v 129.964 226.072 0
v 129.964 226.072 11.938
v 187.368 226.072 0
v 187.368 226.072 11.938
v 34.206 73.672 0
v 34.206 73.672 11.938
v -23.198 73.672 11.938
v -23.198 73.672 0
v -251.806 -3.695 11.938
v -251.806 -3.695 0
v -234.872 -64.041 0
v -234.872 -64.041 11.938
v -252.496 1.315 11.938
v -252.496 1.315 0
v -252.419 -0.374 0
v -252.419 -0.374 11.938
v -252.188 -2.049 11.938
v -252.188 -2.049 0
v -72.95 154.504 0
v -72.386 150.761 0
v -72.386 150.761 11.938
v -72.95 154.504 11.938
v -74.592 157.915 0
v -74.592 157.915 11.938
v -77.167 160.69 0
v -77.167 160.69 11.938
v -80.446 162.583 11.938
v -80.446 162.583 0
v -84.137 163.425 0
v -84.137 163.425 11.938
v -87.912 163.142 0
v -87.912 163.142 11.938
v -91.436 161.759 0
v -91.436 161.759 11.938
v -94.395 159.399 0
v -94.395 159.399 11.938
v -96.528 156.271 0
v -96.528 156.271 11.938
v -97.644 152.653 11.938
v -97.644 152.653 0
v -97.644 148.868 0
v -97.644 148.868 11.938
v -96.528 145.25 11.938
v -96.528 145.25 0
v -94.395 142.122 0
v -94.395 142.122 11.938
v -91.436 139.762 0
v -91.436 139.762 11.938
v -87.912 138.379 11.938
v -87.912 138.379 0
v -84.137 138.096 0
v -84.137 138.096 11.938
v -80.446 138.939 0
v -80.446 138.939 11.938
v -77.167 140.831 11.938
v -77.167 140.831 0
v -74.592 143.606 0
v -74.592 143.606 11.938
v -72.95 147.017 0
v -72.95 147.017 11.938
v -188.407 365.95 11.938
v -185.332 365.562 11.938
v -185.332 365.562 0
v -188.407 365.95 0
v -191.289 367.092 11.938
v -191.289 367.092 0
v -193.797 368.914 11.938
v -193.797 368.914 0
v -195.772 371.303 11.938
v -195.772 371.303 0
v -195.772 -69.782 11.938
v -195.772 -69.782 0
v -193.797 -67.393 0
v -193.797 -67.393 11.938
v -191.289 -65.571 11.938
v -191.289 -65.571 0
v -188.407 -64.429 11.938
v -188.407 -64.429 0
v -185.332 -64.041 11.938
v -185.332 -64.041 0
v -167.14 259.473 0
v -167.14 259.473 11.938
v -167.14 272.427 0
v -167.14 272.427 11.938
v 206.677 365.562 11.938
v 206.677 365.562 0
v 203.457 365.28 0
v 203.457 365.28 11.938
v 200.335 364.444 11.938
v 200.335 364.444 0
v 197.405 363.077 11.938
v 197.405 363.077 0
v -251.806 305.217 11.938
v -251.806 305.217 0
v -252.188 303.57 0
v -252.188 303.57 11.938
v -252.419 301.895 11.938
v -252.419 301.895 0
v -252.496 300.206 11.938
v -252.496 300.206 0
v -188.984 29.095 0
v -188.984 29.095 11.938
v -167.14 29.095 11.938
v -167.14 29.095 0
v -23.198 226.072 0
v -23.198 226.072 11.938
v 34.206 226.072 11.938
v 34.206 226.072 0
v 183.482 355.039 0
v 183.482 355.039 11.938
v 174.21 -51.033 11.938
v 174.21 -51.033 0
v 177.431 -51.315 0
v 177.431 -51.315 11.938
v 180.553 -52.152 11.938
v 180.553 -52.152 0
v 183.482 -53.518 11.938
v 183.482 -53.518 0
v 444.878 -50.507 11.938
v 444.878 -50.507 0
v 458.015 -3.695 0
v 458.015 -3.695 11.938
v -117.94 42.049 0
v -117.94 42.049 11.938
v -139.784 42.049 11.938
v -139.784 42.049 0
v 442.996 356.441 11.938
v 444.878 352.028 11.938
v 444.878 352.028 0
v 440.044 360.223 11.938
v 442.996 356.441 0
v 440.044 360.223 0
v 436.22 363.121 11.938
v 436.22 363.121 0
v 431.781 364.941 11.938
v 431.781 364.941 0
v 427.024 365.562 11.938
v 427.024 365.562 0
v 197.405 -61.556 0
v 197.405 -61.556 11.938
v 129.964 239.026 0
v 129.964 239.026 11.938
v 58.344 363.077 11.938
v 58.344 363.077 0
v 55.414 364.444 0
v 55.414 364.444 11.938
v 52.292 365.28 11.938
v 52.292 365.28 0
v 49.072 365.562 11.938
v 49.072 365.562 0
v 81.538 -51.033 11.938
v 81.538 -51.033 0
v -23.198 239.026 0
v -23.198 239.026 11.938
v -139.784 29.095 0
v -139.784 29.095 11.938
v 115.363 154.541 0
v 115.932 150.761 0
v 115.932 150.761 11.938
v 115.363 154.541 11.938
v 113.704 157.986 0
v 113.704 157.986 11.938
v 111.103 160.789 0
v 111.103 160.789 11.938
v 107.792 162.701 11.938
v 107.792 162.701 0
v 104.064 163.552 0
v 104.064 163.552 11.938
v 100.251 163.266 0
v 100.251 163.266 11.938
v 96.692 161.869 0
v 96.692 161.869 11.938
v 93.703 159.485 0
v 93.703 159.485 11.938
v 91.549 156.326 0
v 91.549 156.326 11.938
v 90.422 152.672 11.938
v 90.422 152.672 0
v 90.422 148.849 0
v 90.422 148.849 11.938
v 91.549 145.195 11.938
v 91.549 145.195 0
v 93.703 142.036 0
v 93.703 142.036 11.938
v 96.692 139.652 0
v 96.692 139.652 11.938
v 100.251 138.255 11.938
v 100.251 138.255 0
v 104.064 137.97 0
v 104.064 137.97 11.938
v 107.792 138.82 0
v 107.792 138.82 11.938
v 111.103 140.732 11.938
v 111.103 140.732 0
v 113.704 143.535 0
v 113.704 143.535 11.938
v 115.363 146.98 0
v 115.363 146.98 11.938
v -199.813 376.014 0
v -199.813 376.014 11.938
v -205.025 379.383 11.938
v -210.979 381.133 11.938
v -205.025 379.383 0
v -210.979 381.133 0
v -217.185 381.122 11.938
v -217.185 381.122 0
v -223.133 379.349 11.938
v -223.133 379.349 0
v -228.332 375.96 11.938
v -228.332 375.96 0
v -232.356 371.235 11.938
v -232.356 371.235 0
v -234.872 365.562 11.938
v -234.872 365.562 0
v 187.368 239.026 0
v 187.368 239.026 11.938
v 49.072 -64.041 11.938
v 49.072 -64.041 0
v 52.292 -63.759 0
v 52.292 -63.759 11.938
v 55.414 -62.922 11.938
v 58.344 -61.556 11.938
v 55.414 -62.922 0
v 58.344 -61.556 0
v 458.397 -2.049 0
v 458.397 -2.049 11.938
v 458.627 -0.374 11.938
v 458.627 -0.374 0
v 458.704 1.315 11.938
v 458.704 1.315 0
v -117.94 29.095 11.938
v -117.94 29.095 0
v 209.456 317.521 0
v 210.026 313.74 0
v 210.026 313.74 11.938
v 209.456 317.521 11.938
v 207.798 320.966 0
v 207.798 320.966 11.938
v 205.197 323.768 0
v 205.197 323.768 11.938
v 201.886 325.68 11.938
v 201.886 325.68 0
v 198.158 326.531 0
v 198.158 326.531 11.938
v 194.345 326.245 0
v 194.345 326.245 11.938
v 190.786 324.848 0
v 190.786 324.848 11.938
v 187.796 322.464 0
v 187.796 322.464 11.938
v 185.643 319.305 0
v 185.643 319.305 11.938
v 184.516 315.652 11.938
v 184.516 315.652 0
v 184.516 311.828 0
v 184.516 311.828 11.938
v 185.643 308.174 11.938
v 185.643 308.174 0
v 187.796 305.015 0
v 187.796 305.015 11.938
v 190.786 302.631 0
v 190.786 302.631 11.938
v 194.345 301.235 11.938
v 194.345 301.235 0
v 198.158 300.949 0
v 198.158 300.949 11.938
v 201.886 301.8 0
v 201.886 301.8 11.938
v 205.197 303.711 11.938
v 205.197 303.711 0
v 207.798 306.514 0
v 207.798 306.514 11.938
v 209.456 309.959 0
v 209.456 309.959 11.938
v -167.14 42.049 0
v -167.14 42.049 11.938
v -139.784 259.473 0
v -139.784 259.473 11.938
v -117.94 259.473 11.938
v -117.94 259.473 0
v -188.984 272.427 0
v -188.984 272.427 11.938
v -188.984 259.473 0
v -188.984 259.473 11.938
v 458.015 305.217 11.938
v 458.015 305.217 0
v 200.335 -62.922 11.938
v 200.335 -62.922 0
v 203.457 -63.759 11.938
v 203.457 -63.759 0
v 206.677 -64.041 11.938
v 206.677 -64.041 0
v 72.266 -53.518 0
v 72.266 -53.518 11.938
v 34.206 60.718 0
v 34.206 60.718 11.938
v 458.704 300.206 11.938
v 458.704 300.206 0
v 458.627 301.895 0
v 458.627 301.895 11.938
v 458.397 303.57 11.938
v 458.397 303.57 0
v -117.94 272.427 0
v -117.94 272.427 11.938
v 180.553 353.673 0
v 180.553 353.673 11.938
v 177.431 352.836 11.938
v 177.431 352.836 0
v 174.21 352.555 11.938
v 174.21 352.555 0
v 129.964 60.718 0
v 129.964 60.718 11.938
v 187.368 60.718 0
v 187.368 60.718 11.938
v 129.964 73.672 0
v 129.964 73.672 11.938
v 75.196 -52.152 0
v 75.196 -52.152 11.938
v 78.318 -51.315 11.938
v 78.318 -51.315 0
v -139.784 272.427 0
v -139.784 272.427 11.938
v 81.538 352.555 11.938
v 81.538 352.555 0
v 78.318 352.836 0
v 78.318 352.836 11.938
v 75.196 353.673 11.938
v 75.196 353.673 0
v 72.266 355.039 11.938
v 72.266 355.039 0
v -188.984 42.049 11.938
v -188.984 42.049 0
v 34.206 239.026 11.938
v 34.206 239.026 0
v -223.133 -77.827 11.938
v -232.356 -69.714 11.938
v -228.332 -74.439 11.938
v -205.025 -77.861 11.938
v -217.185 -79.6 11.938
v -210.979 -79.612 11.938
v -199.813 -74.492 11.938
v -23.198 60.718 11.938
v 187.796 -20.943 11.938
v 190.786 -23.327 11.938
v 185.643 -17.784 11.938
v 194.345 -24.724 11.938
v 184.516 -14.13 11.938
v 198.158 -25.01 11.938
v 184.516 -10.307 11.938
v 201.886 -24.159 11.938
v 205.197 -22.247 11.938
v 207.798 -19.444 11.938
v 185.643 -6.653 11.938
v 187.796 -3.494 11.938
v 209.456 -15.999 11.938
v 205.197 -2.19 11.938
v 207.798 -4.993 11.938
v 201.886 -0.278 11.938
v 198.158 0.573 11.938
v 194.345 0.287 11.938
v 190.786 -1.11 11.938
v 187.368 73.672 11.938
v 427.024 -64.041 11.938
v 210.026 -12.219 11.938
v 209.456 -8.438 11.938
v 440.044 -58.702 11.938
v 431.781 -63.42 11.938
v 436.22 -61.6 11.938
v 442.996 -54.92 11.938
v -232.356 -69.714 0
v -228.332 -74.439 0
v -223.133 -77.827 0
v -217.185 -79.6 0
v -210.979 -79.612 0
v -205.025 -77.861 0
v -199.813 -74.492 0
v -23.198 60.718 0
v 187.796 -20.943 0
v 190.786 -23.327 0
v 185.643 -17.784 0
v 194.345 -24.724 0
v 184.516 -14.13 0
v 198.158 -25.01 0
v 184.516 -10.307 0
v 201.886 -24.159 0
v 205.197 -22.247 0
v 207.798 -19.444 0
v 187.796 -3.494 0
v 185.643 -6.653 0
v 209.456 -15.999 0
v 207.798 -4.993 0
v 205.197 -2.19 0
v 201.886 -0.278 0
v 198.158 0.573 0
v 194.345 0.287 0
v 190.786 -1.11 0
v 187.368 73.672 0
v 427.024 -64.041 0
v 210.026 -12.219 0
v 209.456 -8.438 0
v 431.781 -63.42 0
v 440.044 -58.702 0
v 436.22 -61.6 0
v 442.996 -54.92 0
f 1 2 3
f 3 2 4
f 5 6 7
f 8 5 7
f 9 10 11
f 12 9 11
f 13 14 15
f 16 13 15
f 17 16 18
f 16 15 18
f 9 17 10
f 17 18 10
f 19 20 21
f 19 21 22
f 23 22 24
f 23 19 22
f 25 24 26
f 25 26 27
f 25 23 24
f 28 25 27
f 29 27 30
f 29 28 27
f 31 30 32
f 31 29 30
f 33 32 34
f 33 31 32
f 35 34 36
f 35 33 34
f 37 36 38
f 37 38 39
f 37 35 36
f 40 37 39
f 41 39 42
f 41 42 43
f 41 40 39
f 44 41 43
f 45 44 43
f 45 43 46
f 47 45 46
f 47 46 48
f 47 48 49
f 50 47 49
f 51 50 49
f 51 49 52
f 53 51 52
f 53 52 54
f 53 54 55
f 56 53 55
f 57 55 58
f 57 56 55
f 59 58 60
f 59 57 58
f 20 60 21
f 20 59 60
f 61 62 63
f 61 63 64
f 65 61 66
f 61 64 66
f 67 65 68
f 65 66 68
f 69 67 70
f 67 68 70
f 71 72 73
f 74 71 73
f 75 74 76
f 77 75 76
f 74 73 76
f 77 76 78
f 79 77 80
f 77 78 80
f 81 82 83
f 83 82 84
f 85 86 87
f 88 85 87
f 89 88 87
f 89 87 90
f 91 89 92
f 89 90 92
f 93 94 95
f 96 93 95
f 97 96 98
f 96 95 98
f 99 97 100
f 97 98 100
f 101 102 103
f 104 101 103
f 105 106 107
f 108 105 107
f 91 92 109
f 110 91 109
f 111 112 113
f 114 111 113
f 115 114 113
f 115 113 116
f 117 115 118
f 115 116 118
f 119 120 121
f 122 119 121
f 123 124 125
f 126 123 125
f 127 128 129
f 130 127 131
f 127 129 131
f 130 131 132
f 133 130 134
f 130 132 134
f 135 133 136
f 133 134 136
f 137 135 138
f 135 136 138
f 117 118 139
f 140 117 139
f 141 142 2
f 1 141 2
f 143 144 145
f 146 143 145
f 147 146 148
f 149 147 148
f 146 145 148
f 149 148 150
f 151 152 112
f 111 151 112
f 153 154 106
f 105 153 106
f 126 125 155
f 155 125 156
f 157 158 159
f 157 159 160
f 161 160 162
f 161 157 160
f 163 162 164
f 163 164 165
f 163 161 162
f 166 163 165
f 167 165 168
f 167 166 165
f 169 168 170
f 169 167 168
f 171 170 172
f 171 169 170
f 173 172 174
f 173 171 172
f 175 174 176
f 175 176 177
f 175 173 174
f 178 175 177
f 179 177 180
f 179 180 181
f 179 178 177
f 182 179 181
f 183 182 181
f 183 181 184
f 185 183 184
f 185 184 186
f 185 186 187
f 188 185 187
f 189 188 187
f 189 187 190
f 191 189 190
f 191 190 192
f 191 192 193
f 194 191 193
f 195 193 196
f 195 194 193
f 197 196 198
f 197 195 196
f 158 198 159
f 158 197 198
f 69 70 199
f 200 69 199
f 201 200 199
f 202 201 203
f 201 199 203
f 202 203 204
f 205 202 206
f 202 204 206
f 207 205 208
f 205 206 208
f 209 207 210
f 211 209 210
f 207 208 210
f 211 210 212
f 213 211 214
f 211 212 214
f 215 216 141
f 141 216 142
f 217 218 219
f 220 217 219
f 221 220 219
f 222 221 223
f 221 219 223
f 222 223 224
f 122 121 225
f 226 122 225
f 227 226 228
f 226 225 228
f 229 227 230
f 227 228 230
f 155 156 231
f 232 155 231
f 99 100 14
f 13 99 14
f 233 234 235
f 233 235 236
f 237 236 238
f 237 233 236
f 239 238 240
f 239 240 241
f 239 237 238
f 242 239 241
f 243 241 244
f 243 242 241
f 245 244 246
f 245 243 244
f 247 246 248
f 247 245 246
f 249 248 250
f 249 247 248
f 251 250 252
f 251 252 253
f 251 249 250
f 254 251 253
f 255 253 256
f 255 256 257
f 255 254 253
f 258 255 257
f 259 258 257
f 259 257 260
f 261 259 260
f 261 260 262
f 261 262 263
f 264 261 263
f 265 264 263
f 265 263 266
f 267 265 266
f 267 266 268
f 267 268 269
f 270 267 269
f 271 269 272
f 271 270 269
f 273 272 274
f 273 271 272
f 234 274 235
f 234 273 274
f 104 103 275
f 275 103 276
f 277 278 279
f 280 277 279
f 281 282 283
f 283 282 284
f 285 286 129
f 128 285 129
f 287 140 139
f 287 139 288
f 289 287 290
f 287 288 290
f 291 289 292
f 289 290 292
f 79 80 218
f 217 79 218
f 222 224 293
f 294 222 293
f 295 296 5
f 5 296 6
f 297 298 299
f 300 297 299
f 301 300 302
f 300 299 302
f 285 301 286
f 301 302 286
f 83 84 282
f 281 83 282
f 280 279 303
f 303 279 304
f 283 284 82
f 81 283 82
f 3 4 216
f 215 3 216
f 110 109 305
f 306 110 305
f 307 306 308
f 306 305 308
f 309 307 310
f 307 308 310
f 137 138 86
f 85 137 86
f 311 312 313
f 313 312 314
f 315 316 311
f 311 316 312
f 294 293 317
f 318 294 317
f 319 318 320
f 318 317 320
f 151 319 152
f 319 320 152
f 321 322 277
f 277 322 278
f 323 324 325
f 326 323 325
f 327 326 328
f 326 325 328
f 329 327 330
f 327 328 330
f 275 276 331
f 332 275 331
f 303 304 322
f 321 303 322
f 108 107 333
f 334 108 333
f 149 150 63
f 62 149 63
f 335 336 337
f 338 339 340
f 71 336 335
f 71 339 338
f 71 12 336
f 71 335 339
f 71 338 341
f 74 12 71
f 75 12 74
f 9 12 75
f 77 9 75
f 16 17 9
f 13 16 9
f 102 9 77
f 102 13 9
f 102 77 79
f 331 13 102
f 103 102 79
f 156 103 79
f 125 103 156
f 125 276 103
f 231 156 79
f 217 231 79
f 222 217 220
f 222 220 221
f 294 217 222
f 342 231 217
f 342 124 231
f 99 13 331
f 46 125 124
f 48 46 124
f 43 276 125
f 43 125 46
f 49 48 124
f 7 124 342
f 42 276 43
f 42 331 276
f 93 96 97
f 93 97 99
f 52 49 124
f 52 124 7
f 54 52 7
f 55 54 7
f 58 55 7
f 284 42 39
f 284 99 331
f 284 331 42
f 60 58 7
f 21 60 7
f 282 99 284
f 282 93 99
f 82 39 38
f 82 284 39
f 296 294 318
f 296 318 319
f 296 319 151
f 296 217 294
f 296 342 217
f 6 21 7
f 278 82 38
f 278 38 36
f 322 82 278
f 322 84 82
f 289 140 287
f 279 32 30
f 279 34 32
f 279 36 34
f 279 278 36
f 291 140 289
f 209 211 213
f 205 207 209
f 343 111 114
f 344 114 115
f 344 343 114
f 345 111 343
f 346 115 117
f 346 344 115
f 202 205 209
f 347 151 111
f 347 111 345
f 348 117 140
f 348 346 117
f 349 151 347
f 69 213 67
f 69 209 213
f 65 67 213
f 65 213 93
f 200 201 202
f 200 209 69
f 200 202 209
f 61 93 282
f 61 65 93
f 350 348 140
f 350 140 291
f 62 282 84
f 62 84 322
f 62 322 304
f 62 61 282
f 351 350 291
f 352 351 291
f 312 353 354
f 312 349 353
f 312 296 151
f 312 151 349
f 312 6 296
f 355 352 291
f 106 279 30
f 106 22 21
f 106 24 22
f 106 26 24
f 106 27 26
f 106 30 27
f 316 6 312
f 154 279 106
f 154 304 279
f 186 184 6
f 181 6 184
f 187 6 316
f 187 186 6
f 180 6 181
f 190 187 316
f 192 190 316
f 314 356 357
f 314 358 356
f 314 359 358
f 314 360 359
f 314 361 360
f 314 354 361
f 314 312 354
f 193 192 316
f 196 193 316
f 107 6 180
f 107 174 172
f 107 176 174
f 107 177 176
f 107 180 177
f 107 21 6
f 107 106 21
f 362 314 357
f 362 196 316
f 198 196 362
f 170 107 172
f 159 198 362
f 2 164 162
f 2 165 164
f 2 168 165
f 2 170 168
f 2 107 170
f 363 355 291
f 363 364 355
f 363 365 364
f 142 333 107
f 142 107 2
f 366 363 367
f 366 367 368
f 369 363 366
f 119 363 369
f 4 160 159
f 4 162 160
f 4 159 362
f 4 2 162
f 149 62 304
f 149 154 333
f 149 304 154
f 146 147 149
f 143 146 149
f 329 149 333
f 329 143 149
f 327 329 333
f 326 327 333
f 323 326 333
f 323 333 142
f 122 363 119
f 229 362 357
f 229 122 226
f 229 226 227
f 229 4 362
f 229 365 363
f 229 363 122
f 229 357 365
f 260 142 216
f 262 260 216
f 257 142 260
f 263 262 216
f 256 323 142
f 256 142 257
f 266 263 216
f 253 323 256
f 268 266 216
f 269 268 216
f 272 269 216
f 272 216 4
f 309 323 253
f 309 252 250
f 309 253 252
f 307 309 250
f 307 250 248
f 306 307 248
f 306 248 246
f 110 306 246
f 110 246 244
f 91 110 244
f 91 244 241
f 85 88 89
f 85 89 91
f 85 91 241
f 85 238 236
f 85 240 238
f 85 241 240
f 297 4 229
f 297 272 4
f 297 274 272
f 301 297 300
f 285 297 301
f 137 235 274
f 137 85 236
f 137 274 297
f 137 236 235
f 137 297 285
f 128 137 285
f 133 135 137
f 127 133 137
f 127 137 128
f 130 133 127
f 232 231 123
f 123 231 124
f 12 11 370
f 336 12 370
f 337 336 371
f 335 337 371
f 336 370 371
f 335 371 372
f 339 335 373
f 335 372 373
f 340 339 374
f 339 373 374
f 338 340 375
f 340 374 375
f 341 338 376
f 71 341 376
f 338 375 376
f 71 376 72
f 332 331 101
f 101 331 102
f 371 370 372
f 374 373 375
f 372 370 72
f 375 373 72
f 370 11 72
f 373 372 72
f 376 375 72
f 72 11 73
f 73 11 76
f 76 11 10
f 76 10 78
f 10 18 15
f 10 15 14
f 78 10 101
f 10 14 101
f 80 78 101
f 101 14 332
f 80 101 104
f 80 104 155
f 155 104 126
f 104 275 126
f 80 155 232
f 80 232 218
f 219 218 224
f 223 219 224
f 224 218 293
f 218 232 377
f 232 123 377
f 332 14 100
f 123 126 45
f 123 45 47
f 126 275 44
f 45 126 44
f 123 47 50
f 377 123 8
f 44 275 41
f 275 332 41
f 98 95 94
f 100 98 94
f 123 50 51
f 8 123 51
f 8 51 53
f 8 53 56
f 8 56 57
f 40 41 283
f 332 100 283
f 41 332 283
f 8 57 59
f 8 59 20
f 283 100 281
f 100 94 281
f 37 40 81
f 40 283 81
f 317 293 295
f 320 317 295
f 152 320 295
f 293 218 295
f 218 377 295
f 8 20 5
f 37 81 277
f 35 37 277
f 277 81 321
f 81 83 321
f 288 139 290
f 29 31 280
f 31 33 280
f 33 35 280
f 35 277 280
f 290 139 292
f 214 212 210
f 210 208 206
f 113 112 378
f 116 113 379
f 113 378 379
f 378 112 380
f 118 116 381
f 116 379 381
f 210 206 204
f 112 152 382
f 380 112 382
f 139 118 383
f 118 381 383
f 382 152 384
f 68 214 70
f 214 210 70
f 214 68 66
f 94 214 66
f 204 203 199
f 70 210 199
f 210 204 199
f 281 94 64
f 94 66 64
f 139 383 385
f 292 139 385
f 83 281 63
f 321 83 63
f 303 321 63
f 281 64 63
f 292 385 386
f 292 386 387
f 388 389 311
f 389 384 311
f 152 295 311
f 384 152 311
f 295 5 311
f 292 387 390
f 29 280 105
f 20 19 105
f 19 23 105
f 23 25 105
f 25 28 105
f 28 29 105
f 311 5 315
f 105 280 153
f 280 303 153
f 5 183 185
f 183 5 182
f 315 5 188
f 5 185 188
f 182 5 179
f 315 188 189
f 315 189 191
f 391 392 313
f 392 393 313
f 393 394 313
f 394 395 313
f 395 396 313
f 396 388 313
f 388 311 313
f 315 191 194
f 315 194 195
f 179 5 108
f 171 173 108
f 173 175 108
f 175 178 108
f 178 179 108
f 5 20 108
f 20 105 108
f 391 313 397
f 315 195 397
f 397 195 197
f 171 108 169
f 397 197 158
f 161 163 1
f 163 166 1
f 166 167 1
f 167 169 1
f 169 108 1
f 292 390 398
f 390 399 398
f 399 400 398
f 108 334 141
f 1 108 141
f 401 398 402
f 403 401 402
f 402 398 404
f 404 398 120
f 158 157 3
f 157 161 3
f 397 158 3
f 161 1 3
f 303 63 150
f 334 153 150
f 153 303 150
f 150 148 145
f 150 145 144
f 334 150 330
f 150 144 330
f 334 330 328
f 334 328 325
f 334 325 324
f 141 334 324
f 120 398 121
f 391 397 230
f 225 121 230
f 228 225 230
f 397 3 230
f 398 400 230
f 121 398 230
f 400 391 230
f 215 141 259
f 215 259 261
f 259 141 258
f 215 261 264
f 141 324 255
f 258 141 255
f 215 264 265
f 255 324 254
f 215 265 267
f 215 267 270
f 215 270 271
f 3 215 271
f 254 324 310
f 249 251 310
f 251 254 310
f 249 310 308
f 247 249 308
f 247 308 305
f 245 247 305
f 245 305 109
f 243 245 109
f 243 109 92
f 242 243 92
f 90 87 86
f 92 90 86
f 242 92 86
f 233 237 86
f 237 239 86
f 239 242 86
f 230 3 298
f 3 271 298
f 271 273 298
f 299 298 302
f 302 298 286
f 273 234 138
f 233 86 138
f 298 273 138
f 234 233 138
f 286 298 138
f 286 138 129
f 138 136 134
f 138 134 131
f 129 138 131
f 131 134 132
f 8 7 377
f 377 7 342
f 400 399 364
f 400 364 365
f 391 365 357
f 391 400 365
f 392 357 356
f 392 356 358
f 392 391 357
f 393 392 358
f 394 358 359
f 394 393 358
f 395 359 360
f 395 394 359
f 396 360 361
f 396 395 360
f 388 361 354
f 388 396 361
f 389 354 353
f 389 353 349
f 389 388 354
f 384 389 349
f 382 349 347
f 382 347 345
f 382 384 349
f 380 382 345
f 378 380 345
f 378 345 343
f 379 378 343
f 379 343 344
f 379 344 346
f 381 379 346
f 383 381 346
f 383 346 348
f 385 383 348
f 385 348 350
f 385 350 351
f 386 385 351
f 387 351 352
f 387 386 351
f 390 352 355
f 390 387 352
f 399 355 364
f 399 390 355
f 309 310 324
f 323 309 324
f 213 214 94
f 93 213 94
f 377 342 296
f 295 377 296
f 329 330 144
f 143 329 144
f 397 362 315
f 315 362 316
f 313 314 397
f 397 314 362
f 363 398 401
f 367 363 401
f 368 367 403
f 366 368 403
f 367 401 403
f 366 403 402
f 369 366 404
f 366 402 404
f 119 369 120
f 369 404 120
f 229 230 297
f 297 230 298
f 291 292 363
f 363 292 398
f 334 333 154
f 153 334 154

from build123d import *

# Parameters (mm, degrees)
F0_R     = 12.7
F0_R_2   = 12.827
F1_DEPTH = 11.938
F3_DEPTH = 25.4
F5_DEPTH = 25.4


with BuildPart() as f1:
    # F0 (on Top) → F1 (new body)
    with BuildSketch(Plane.XY):
        with BuildLine():
            Line((58.34362, -61.556164), (72.2663, -53.5179))
            ThreePointArc((72.2663, -53.5179), (76.738749, -51.665351), (81.538278, -51.033481))
            Line((81.538278, -51.033481), (174.210487, -51.033481))
            ThreePointArc((174.210487, -51.033481), (179.010016, -51.665351), (183.482465, -53.517901))
            Line((183.482465, -53.517901), (197.405145, -61.556163))
            ThreePointArc((197.405145, -61.556163), (201.877594, -63.408713), (206.677123, -64.040582))
            Line((206.677123, -64.040582), (427.024152, -64.040582))
            ThreePointArc((427.024152, -64.040582), (438.226145, -60.274774), (444.878456, -50.506831))
            Line((444.878456, -50.506831), (458.014524, -3.695302))
            ThreePointArc((458.014524, -3.695302), (458.530955, -1.213822), (458.704177, 1.314901))
            Line((458.704177, 1.314901), (458.704177, 19.696639))
            Line((458.704177, 19.696639), (458.704177, 281.824639))
            Line((458.704177, 281.824639), (458.704177, 300.206376))
            ThreePointArc((458.704177, 300.206376), (458.530955, 302.735101), (458.014524, 305.216583))
            Line((458.014524, 305.216583), (444.878456, 352.02811))
            ThreePointArc((444.878456, 352.02811), (438.226145, 361.796053), (427.024152, 365.561861))
            Line((427.024152, 365.561861), (206.677126, 365.561861))
            ThreePointArc((206.677126, 365.561861), (201.877596, 364.929991), (197.405147, 363.077442))
            Line((197.405147, 363.077442), (183.482464, 355.039177))
            ThreePointArc((183.482464, 355.039177), (179.010015, 353.186628), (174.210486, 352.554758))
            Line((174.210486, 352.554758), (81.538278, 352.554758))
            ThreePointArc((81.538278, 352.554758), (76.738749, 353.186628), (72.2663, 355.039177))
            Line((72.2663, 355.039177), (58.34362, 363.07744))
            ThreePointArc((58.34362, 363.07744), (53.871171, 364.929989), (49.071641, 365.561859))
            Line((49.071641, 365.561859), (-185.331903, 365.561859))
            ThreePointArc((-185.331903, 365.561859), (-191.289303, 367.091944), (-195.772045, 371.30345))
            ThreePointArc((-195.772045, 371.30345), (-217.185472, 381.121689), (-234.872313, 365.561859))
            Line((-234.872313, 365.561859), (-251.80617, 305.216581))
            ThreePointArc((-251.80617, 305.216581), (-252.322601, 302.735099), (-252.495823, 300.206375))
            Line((-252.495823, 300.206375), (-252.495823, 281.82464))
            Line((-252.495823, 281.82464), (-252.495823, 19.69664))
            Line((-252.495823, 19.69664), (-252.495823, 1.314901))
            ThreePointArc((-252.495823, 1.314901), (-252.322601, -1.213823), (-251.80617, -3.695304))
            Line((-251.80617, -3.695304), (-234.872313, -64.040583))
            ThreePointArc((-234.872313, -64.040583), (-217.185472, -79.600413), (-195.772045, -69.782174))
            ThreePointArc((-195.772045, -69.782174), (-191.289303, -65.570667), (-185.331903, -64.040583))
            Line((-185.331903, -64.040583), (49.071641, -64.040583))
            ThreePointArc((49.071641, -64.040583), (53.871171, -63.408713), (58.34362, -61.556164))
        make_face()
        with Locations((-85.085704, 150.760638)):
            Circle(F0_R, mode=Mode.SUBTRACT)
        with Locations((197.19935, -12.218626)):
            Circle(F0_R_2, mode=Mode.SUBTRACT)
        with Locations((103.105436, 150.760638)):
            Circle(F0_R_2, mode=Mode.SUBTRACT)
        with Locations((197.19935, 313.739902)):
            Circle(F0_R_2, mode=Mode.SUBTRACT)
    extrude(amount=F1_DEPTH)

    # F2 (on face) → F3 (cut)
    with BuildSketch(Plane.XY.offset(11.938)):
        Polygon((-170.314763, 272.426638), (-185.808763, 272.426638), (-188.983763, 272.426638), (-188.983763, 259.472638), (-185.808763, 259.472638), (-170.314763, 259.472638), (-167.139763, 259.472638), (-167.139763, 272.426638), align=None)
        Polygon((-136.608963, 259.472638), (-121.114963, 259.472638), (-117.939963, 259.472638), (-117.939963, 272.426638), (-121.114963, 272.426638), (-136.608963, 272.426638), (-139.783963, 272.426638), (-139.783963, 259.472638), align=None)
        Polygon((-188.983763, 29.094638), (-185.808763, 29.094638), (-170.314763, 29.094638), (-167.139763, 29.094638), (-167.139763, 42.048638), (-170.314763, 42.048638), (-185.808763, 42.048638), (-188.983763, 42.048638), align=None)
        Polygon((-117.939963, 42.048638), (-121.114963, 42.048638), (-136.608963, 42.048638), (-139.783963, 42.048638), (-139.783963, 29.094638), (-136.608963, 29.094638), (-121.114963, 29.094638), (-117.939963, 29.094638), align=None)
    extrude(amount=-F3_DEPTH, mode=Mode.SUBTRACT)

    # F4 (on face) → F5 (cut)
    with BuildSketch(Plane.XY.offset(11.938)):
        Polygon((31.031037, 73.671638), (-20.022963, 73.671638), (-23.197963, 73.671638), (-23.197963, 60.717638), (-20.022963, 60.717638), (31.031037, 60.717638), (34.206037, 60.717638), (34.206037, 73.671638), align=None)
        Polygon((187.368037, 73.671638), (184.193037, 73.671638), (133.139037, 73.671638), (129.964037, 73.671638), (129.964037, 60.717638), (133.139037, 60.717638), (184.193037, 60.717638), (187.368037, 60.717638), align=None)
        Polygon((-23.197963, 226.071638), (-20.022963, 226.071638), (31.031037, 226.071638), (34.206037, 226.071638), (34.206037, 239.025638), (31.031037, 239.025638), (-20.022963, 239.025638), (-23.197963, 239.025638), align=None)
        Polygon((133.139037, 226.071638), (184.193037, 226.071638), (187.368037, 226.071638), (187.368037, 239.025638), (184.193037, 239.025638), (133.139037, 239.025638), (129.964037, 239.025638), (129.964037, 226.071638), align=None)
    extrude(amount=-F5_DEPTH, mode=Mode.SUBTRACT)


solid = f1.part
